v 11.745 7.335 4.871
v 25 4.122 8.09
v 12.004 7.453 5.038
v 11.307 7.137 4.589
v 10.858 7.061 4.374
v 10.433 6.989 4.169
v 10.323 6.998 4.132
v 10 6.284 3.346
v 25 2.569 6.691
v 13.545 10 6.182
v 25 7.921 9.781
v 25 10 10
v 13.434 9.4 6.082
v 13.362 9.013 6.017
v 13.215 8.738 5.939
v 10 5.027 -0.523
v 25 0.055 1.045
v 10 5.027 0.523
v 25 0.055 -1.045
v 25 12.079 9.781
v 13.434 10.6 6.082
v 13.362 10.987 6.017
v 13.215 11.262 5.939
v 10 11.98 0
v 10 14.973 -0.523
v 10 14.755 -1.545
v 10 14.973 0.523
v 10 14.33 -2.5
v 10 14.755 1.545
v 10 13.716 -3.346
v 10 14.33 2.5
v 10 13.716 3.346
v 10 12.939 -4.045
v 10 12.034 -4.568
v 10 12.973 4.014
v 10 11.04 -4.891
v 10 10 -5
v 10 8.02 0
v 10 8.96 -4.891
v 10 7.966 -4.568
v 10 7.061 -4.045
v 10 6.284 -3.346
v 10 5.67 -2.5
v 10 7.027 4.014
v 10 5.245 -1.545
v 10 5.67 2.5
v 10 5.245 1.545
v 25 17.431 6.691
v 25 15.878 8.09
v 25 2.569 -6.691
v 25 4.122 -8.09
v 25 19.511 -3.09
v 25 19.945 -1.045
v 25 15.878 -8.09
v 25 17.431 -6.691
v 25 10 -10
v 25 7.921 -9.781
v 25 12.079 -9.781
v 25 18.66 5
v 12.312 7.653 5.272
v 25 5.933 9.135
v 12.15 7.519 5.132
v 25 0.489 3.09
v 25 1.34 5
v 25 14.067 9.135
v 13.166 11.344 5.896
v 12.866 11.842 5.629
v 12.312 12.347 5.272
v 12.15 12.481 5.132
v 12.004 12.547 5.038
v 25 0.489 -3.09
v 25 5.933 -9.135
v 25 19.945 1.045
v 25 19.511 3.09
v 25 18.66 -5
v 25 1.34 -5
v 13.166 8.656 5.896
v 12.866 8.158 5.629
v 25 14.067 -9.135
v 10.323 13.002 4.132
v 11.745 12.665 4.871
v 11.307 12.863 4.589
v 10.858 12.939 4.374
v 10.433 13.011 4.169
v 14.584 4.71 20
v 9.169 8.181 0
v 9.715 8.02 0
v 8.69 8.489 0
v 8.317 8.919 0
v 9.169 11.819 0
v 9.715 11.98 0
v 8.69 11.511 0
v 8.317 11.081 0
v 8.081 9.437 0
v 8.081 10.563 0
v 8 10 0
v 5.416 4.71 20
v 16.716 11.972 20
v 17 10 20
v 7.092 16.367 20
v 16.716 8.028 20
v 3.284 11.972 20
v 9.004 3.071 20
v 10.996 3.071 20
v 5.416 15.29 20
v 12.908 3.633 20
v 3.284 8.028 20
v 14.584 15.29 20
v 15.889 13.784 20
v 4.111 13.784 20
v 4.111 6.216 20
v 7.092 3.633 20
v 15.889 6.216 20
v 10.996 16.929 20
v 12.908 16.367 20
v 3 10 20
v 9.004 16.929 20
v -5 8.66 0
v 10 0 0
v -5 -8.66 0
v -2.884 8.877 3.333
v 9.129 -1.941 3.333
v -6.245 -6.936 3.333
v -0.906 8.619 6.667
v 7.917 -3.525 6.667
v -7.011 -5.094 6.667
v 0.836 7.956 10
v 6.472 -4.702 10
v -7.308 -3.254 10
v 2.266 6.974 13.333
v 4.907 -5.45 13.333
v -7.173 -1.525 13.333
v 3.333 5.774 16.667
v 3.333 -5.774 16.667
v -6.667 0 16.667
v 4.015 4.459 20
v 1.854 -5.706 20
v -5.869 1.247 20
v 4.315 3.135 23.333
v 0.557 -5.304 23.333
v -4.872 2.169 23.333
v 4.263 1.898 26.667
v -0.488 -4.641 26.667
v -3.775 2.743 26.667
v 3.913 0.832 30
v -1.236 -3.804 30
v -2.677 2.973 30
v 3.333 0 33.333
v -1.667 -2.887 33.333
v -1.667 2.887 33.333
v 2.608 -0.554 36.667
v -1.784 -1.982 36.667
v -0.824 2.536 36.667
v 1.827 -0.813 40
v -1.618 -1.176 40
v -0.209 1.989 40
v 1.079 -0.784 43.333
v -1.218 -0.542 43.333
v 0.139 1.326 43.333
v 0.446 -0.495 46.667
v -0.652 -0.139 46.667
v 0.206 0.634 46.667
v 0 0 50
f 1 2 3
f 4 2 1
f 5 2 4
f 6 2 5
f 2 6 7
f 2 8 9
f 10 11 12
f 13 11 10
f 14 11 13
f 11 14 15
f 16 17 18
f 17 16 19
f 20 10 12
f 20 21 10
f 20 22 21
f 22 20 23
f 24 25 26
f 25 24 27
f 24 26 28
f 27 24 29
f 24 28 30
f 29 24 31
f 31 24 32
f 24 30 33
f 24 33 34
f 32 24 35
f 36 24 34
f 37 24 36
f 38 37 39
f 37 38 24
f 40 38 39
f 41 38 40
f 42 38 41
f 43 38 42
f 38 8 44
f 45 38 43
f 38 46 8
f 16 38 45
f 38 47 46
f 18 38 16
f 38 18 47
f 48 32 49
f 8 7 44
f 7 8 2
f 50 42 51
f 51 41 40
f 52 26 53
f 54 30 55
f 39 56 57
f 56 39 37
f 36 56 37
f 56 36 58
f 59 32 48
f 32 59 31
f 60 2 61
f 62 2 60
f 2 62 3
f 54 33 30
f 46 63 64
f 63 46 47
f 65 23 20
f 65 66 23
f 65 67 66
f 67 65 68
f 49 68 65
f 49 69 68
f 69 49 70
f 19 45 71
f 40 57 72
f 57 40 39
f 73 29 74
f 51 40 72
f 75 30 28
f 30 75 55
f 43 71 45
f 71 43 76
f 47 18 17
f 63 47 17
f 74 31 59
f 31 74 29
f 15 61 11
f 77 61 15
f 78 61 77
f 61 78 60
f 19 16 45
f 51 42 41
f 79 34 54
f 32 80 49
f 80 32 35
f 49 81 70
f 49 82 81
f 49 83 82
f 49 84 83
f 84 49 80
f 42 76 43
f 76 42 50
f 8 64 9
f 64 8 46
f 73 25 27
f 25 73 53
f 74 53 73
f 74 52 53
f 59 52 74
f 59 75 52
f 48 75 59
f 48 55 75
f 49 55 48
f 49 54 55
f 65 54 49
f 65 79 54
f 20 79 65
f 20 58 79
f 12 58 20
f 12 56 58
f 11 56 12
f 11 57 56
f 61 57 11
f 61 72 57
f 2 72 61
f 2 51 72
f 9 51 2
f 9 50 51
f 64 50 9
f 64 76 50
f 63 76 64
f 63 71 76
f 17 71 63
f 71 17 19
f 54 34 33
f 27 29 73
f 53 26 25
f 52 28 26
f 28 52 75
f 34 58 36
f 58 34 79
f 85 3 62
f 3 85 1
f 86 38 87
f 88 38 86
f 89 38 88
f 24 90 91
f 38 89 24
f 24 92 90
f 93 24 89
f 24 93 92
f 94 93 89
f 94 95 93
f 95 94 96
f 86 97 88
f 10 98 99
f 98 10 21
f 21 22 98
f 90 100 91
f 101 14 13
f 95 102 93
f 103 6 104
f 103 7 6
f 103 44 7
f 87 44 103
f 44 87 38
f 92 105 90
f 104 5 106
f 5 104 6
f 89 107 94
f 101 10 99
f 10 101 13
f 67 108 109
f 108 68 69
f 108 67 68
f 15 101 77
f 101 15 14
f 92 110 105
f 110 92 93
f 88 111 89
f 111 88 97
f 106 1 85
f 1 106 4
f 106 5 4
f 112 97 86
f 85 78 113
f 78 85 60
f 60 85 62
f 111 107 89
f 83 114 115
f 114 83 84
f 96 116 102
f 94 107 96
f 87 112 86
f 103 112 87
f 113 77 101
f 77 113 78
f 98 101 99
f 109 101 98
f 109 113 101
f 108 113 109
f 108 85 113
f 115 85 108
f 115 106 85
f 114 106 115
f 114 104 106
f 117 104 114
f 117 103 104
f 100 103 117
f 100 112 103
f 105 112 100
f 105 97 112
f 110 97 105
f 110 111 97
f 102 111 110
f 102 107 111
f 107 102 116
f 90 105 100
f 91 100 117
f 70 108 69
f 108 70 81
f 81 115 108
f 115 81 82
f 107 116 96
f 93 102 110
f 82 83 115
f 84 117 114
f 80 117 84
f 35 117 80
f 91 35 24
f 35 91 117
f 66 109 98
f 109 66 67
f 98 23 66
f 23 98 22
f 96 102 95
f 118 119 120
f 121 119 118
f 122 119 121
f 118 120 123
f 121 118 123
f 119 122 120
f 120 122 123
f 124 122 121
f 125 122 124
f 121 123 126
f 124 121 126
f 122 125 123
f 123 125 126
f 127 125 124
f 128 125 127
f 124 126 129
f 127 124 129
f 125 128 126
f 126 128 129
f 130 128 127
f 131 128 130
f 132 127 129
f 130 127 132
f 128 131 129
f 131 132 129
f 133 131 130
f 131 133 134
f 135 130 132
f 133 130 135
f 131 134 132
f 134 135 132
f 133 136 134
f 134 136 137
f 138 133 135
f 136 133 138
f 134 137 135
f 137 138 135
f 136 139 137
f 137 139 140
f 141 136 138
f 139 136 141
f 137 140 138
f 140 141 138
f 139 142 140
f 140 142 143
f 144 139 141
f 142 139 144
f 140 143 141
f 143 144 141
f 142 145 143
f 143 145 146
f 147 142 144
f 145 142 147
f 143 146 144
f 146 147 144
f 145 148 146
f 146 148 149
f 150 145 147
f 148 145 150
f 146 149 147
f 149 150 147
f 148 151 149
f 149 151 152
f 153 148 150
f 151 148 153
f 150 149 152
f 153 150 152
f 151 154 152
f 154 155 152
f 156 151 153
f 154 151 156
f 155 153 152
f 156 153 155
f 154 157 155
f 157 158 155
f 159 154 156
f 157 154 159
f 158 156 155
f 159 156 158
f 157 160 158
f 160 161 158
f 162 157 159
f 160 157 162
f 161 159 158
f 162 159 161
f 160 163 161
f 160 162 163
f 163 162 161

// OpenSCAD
//$fn=200;

color("blue")
    linear_extrude(height=50, twist=180, scale=0)
        circle(10, $fn=3);

translate([10,10,0]){
    rotate(a=90, v=[0,1,0])
    cylinder(15,5,10);
    //cylinder(height, radius1, radius2)
    //but you can specify a different order
    cylinder(r1=2, h=20, r2=7);
}
